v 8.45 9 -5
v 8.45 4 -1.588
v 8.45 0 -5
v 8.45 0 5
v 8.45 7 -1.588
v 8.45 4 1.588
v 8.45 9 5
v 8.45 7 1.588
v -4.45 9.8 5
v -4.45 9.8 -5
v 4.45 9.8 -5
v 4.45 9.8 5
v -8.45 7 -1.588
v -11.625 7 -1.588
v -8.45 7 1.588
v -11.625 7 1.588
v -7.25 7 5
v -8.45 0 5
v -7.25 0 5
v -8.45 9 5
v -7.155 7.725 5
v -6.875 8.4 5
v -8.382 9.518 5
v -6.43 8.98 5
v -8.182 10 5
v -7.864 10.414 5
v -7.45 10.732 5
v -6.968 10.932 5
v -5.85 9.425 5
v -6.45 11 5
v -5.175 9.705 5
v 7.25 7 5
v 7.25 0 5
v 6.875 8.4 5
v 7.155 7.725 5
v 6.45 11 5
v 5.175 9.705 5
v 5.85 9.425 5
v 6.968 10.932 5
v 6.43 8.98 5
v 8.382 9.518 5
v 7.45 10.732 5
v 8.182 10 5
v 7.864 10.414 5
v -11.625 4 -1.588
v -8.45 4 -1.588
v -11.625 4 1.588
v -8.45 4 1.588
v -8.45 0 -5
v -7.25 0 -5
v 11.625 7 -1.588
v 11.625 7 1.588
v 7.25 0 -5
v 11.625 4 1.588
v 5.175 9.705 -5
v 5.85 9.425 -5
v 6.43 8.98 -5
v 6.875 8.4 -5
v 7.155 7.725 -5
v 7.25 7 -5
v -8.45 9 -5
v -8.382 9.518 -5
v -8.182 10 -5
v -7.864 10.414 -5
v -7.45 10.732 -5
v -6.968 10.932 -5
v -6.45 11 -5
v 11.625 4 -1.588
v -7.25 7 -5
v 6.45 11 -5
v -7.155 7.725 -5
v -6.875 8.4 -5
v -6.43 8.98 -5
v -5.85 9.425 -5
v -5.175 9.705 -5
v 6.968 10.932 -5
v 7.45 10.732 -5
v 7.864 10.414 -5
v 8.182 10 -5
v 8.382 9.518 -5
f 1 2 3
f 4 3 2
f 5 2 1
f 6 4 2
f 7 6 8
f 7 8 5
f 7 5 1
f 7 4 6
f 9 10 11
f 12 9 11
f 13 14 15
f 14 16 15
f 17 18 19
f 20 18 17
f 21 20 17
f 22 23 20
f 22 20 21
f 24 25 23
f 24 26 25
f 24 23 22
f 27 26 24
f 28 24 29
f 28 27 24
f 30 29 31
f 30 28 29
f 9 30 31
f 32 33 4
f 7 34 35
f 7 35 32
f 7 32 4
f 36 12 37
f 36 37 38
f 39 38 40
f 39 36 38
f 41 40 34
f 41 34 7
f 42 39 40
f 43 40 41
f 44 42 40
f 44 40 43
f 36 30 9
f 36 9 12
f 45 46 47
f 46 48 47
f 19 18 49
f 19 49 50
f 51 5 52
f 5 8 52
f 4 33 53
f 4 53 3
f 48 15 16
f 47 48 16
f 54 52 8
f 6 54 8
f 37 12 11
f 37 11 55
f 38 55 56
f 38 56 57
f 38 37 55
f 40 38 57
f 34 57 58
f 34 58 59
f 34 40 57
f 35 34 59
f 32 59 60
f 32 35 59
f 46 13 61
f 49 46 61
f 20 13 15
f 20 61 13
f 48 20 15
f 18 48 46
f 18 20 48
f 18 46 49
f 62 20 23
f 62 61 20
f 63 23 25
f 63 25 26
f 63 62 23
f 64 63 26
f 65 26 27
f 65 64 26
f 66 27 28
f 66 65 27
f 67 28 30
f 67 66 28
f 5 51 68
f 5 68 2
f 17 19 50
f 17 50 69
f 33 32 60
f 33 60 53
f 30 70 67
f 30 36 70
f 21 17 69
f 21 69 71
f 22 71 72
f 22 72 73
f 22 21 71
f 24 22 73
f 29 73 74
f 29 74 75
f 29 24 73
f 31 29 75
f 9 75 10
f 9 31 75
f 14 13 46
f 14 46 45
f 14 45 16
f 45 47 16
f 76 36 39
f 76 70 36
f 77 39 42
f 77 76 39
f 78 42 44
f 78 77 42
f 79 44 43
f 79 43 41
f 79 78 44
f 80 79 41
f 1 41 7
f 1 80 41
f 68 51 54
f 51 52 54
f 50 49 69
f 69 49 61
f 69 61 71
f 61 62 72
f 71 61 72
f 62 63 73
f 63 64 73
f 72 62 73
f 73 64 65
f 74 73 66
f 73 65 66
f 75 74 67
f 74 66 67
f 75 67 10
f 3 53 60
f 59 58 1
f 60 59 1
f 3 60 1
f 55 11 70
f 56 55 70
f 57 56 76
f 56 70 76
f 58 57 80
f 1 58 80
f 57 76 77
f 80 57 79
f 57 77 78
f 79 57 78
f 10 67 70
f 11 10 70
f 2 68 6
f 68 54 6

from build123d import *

# Parameters (mm, degrees)
BOSS_EXTRUDE1_DEPTH = 1.5875
BOSS_EXTRUDE2_DEPTH = 5
FILLET1_R           = 2
FILLET2_R           = 2
CUT_EXTRUDE1_DEPTH  = 10


with BuildPart() as part:
    # Sketch1 → Boss-Extrude1 (new body, symmetric)
    with BuildSketch(Plane.XY):
        Polygon((8.45, 11), (8.45, 7), (11.625, 7), (11.625, 4), (8.45, 4), (8.45, 0), (6.45, 0), (6.45, 9), (-6.45, 9), (-6.45, 0), (-8.45, 0), (-8.45, 4), (-11.625, 4), (-11.625, 7), (-8.45, 7), (-8.45, 11), align=None)
    extrude(amount=BOSS_EXTRUDE1_DEPTH, both=True)

    # Sketch2 → Boss-Extrude2 (add, symmetric)
    with BuildSketch(Plane.XY):
        Polygon((-8.45, 7), (-8.45, 4), (-8.45, 0), (-6.45, 0), (-6.45, 9), (6.45, 9), (6.45, 0), (8.45, 0), (8.45, 4), (8.45, 7), (8.45, 11), (-8.45, 11), align=None)
    extrude(amount=BOSS_EXTRUDE2_DEPTH, both=True)

    # Fillet1
    fillet1_edges = [part.edges().sort_by_distance(p)[0] for p in [
        (6.45, 9, 0),
        (-6.45, 9, 0),
    ]]
    fillet(fillet1_edges, radius=FILLET1_R)

    # Fillet2
    fillet2_edges = [part.edges().sort_by_distance(p)[0] for p in [
        (8.45, 11, 0),
        (-8.45, 11, 0),
    ]]
    fillet(fillet2_edges, radius=FILLET2_R)

    # Sketch3 → Cut-Extrude1 (cut)
    with BuildSketch(Plane.XY.offset(5)):
        with BuildLine():
            Line((7.25, 7), (7.25, 0))
            Line((7.25, 0), (6.45, 0))
            Line((6.45, 0), (6.45, 7))
            ThreePointArc((6.45, 7), (5.864213562, 8.414213562), (4.45, 9))
            Line((4.45, 9), (-4.45, 9))
            ThreePointArc((-4.45, 9), (-5.864213562, 8.414213562), (-6.45, 7))
            Line((-6.45, 7), (-6.45, 0))
            Line((-6.45, 0), (-7.25, 0))
            Line((-7.25, 0), (-7.25, 7))
            ThreePointArc((-7.25, 7), (-6.429898987, 8.979898987), (-4.45, 9.8))
            Line((-4.45, 9.8), (4.45, 9.8))
            ThreePointArc((4.45, 9.8), (6.429898987, 8.979898987), (7.25, 7))
        make_face()
    extrude(amount=-CUT_EXTRUDE1_DEPTH, mode=Mode.SUBTRACT)


solid = part.part
